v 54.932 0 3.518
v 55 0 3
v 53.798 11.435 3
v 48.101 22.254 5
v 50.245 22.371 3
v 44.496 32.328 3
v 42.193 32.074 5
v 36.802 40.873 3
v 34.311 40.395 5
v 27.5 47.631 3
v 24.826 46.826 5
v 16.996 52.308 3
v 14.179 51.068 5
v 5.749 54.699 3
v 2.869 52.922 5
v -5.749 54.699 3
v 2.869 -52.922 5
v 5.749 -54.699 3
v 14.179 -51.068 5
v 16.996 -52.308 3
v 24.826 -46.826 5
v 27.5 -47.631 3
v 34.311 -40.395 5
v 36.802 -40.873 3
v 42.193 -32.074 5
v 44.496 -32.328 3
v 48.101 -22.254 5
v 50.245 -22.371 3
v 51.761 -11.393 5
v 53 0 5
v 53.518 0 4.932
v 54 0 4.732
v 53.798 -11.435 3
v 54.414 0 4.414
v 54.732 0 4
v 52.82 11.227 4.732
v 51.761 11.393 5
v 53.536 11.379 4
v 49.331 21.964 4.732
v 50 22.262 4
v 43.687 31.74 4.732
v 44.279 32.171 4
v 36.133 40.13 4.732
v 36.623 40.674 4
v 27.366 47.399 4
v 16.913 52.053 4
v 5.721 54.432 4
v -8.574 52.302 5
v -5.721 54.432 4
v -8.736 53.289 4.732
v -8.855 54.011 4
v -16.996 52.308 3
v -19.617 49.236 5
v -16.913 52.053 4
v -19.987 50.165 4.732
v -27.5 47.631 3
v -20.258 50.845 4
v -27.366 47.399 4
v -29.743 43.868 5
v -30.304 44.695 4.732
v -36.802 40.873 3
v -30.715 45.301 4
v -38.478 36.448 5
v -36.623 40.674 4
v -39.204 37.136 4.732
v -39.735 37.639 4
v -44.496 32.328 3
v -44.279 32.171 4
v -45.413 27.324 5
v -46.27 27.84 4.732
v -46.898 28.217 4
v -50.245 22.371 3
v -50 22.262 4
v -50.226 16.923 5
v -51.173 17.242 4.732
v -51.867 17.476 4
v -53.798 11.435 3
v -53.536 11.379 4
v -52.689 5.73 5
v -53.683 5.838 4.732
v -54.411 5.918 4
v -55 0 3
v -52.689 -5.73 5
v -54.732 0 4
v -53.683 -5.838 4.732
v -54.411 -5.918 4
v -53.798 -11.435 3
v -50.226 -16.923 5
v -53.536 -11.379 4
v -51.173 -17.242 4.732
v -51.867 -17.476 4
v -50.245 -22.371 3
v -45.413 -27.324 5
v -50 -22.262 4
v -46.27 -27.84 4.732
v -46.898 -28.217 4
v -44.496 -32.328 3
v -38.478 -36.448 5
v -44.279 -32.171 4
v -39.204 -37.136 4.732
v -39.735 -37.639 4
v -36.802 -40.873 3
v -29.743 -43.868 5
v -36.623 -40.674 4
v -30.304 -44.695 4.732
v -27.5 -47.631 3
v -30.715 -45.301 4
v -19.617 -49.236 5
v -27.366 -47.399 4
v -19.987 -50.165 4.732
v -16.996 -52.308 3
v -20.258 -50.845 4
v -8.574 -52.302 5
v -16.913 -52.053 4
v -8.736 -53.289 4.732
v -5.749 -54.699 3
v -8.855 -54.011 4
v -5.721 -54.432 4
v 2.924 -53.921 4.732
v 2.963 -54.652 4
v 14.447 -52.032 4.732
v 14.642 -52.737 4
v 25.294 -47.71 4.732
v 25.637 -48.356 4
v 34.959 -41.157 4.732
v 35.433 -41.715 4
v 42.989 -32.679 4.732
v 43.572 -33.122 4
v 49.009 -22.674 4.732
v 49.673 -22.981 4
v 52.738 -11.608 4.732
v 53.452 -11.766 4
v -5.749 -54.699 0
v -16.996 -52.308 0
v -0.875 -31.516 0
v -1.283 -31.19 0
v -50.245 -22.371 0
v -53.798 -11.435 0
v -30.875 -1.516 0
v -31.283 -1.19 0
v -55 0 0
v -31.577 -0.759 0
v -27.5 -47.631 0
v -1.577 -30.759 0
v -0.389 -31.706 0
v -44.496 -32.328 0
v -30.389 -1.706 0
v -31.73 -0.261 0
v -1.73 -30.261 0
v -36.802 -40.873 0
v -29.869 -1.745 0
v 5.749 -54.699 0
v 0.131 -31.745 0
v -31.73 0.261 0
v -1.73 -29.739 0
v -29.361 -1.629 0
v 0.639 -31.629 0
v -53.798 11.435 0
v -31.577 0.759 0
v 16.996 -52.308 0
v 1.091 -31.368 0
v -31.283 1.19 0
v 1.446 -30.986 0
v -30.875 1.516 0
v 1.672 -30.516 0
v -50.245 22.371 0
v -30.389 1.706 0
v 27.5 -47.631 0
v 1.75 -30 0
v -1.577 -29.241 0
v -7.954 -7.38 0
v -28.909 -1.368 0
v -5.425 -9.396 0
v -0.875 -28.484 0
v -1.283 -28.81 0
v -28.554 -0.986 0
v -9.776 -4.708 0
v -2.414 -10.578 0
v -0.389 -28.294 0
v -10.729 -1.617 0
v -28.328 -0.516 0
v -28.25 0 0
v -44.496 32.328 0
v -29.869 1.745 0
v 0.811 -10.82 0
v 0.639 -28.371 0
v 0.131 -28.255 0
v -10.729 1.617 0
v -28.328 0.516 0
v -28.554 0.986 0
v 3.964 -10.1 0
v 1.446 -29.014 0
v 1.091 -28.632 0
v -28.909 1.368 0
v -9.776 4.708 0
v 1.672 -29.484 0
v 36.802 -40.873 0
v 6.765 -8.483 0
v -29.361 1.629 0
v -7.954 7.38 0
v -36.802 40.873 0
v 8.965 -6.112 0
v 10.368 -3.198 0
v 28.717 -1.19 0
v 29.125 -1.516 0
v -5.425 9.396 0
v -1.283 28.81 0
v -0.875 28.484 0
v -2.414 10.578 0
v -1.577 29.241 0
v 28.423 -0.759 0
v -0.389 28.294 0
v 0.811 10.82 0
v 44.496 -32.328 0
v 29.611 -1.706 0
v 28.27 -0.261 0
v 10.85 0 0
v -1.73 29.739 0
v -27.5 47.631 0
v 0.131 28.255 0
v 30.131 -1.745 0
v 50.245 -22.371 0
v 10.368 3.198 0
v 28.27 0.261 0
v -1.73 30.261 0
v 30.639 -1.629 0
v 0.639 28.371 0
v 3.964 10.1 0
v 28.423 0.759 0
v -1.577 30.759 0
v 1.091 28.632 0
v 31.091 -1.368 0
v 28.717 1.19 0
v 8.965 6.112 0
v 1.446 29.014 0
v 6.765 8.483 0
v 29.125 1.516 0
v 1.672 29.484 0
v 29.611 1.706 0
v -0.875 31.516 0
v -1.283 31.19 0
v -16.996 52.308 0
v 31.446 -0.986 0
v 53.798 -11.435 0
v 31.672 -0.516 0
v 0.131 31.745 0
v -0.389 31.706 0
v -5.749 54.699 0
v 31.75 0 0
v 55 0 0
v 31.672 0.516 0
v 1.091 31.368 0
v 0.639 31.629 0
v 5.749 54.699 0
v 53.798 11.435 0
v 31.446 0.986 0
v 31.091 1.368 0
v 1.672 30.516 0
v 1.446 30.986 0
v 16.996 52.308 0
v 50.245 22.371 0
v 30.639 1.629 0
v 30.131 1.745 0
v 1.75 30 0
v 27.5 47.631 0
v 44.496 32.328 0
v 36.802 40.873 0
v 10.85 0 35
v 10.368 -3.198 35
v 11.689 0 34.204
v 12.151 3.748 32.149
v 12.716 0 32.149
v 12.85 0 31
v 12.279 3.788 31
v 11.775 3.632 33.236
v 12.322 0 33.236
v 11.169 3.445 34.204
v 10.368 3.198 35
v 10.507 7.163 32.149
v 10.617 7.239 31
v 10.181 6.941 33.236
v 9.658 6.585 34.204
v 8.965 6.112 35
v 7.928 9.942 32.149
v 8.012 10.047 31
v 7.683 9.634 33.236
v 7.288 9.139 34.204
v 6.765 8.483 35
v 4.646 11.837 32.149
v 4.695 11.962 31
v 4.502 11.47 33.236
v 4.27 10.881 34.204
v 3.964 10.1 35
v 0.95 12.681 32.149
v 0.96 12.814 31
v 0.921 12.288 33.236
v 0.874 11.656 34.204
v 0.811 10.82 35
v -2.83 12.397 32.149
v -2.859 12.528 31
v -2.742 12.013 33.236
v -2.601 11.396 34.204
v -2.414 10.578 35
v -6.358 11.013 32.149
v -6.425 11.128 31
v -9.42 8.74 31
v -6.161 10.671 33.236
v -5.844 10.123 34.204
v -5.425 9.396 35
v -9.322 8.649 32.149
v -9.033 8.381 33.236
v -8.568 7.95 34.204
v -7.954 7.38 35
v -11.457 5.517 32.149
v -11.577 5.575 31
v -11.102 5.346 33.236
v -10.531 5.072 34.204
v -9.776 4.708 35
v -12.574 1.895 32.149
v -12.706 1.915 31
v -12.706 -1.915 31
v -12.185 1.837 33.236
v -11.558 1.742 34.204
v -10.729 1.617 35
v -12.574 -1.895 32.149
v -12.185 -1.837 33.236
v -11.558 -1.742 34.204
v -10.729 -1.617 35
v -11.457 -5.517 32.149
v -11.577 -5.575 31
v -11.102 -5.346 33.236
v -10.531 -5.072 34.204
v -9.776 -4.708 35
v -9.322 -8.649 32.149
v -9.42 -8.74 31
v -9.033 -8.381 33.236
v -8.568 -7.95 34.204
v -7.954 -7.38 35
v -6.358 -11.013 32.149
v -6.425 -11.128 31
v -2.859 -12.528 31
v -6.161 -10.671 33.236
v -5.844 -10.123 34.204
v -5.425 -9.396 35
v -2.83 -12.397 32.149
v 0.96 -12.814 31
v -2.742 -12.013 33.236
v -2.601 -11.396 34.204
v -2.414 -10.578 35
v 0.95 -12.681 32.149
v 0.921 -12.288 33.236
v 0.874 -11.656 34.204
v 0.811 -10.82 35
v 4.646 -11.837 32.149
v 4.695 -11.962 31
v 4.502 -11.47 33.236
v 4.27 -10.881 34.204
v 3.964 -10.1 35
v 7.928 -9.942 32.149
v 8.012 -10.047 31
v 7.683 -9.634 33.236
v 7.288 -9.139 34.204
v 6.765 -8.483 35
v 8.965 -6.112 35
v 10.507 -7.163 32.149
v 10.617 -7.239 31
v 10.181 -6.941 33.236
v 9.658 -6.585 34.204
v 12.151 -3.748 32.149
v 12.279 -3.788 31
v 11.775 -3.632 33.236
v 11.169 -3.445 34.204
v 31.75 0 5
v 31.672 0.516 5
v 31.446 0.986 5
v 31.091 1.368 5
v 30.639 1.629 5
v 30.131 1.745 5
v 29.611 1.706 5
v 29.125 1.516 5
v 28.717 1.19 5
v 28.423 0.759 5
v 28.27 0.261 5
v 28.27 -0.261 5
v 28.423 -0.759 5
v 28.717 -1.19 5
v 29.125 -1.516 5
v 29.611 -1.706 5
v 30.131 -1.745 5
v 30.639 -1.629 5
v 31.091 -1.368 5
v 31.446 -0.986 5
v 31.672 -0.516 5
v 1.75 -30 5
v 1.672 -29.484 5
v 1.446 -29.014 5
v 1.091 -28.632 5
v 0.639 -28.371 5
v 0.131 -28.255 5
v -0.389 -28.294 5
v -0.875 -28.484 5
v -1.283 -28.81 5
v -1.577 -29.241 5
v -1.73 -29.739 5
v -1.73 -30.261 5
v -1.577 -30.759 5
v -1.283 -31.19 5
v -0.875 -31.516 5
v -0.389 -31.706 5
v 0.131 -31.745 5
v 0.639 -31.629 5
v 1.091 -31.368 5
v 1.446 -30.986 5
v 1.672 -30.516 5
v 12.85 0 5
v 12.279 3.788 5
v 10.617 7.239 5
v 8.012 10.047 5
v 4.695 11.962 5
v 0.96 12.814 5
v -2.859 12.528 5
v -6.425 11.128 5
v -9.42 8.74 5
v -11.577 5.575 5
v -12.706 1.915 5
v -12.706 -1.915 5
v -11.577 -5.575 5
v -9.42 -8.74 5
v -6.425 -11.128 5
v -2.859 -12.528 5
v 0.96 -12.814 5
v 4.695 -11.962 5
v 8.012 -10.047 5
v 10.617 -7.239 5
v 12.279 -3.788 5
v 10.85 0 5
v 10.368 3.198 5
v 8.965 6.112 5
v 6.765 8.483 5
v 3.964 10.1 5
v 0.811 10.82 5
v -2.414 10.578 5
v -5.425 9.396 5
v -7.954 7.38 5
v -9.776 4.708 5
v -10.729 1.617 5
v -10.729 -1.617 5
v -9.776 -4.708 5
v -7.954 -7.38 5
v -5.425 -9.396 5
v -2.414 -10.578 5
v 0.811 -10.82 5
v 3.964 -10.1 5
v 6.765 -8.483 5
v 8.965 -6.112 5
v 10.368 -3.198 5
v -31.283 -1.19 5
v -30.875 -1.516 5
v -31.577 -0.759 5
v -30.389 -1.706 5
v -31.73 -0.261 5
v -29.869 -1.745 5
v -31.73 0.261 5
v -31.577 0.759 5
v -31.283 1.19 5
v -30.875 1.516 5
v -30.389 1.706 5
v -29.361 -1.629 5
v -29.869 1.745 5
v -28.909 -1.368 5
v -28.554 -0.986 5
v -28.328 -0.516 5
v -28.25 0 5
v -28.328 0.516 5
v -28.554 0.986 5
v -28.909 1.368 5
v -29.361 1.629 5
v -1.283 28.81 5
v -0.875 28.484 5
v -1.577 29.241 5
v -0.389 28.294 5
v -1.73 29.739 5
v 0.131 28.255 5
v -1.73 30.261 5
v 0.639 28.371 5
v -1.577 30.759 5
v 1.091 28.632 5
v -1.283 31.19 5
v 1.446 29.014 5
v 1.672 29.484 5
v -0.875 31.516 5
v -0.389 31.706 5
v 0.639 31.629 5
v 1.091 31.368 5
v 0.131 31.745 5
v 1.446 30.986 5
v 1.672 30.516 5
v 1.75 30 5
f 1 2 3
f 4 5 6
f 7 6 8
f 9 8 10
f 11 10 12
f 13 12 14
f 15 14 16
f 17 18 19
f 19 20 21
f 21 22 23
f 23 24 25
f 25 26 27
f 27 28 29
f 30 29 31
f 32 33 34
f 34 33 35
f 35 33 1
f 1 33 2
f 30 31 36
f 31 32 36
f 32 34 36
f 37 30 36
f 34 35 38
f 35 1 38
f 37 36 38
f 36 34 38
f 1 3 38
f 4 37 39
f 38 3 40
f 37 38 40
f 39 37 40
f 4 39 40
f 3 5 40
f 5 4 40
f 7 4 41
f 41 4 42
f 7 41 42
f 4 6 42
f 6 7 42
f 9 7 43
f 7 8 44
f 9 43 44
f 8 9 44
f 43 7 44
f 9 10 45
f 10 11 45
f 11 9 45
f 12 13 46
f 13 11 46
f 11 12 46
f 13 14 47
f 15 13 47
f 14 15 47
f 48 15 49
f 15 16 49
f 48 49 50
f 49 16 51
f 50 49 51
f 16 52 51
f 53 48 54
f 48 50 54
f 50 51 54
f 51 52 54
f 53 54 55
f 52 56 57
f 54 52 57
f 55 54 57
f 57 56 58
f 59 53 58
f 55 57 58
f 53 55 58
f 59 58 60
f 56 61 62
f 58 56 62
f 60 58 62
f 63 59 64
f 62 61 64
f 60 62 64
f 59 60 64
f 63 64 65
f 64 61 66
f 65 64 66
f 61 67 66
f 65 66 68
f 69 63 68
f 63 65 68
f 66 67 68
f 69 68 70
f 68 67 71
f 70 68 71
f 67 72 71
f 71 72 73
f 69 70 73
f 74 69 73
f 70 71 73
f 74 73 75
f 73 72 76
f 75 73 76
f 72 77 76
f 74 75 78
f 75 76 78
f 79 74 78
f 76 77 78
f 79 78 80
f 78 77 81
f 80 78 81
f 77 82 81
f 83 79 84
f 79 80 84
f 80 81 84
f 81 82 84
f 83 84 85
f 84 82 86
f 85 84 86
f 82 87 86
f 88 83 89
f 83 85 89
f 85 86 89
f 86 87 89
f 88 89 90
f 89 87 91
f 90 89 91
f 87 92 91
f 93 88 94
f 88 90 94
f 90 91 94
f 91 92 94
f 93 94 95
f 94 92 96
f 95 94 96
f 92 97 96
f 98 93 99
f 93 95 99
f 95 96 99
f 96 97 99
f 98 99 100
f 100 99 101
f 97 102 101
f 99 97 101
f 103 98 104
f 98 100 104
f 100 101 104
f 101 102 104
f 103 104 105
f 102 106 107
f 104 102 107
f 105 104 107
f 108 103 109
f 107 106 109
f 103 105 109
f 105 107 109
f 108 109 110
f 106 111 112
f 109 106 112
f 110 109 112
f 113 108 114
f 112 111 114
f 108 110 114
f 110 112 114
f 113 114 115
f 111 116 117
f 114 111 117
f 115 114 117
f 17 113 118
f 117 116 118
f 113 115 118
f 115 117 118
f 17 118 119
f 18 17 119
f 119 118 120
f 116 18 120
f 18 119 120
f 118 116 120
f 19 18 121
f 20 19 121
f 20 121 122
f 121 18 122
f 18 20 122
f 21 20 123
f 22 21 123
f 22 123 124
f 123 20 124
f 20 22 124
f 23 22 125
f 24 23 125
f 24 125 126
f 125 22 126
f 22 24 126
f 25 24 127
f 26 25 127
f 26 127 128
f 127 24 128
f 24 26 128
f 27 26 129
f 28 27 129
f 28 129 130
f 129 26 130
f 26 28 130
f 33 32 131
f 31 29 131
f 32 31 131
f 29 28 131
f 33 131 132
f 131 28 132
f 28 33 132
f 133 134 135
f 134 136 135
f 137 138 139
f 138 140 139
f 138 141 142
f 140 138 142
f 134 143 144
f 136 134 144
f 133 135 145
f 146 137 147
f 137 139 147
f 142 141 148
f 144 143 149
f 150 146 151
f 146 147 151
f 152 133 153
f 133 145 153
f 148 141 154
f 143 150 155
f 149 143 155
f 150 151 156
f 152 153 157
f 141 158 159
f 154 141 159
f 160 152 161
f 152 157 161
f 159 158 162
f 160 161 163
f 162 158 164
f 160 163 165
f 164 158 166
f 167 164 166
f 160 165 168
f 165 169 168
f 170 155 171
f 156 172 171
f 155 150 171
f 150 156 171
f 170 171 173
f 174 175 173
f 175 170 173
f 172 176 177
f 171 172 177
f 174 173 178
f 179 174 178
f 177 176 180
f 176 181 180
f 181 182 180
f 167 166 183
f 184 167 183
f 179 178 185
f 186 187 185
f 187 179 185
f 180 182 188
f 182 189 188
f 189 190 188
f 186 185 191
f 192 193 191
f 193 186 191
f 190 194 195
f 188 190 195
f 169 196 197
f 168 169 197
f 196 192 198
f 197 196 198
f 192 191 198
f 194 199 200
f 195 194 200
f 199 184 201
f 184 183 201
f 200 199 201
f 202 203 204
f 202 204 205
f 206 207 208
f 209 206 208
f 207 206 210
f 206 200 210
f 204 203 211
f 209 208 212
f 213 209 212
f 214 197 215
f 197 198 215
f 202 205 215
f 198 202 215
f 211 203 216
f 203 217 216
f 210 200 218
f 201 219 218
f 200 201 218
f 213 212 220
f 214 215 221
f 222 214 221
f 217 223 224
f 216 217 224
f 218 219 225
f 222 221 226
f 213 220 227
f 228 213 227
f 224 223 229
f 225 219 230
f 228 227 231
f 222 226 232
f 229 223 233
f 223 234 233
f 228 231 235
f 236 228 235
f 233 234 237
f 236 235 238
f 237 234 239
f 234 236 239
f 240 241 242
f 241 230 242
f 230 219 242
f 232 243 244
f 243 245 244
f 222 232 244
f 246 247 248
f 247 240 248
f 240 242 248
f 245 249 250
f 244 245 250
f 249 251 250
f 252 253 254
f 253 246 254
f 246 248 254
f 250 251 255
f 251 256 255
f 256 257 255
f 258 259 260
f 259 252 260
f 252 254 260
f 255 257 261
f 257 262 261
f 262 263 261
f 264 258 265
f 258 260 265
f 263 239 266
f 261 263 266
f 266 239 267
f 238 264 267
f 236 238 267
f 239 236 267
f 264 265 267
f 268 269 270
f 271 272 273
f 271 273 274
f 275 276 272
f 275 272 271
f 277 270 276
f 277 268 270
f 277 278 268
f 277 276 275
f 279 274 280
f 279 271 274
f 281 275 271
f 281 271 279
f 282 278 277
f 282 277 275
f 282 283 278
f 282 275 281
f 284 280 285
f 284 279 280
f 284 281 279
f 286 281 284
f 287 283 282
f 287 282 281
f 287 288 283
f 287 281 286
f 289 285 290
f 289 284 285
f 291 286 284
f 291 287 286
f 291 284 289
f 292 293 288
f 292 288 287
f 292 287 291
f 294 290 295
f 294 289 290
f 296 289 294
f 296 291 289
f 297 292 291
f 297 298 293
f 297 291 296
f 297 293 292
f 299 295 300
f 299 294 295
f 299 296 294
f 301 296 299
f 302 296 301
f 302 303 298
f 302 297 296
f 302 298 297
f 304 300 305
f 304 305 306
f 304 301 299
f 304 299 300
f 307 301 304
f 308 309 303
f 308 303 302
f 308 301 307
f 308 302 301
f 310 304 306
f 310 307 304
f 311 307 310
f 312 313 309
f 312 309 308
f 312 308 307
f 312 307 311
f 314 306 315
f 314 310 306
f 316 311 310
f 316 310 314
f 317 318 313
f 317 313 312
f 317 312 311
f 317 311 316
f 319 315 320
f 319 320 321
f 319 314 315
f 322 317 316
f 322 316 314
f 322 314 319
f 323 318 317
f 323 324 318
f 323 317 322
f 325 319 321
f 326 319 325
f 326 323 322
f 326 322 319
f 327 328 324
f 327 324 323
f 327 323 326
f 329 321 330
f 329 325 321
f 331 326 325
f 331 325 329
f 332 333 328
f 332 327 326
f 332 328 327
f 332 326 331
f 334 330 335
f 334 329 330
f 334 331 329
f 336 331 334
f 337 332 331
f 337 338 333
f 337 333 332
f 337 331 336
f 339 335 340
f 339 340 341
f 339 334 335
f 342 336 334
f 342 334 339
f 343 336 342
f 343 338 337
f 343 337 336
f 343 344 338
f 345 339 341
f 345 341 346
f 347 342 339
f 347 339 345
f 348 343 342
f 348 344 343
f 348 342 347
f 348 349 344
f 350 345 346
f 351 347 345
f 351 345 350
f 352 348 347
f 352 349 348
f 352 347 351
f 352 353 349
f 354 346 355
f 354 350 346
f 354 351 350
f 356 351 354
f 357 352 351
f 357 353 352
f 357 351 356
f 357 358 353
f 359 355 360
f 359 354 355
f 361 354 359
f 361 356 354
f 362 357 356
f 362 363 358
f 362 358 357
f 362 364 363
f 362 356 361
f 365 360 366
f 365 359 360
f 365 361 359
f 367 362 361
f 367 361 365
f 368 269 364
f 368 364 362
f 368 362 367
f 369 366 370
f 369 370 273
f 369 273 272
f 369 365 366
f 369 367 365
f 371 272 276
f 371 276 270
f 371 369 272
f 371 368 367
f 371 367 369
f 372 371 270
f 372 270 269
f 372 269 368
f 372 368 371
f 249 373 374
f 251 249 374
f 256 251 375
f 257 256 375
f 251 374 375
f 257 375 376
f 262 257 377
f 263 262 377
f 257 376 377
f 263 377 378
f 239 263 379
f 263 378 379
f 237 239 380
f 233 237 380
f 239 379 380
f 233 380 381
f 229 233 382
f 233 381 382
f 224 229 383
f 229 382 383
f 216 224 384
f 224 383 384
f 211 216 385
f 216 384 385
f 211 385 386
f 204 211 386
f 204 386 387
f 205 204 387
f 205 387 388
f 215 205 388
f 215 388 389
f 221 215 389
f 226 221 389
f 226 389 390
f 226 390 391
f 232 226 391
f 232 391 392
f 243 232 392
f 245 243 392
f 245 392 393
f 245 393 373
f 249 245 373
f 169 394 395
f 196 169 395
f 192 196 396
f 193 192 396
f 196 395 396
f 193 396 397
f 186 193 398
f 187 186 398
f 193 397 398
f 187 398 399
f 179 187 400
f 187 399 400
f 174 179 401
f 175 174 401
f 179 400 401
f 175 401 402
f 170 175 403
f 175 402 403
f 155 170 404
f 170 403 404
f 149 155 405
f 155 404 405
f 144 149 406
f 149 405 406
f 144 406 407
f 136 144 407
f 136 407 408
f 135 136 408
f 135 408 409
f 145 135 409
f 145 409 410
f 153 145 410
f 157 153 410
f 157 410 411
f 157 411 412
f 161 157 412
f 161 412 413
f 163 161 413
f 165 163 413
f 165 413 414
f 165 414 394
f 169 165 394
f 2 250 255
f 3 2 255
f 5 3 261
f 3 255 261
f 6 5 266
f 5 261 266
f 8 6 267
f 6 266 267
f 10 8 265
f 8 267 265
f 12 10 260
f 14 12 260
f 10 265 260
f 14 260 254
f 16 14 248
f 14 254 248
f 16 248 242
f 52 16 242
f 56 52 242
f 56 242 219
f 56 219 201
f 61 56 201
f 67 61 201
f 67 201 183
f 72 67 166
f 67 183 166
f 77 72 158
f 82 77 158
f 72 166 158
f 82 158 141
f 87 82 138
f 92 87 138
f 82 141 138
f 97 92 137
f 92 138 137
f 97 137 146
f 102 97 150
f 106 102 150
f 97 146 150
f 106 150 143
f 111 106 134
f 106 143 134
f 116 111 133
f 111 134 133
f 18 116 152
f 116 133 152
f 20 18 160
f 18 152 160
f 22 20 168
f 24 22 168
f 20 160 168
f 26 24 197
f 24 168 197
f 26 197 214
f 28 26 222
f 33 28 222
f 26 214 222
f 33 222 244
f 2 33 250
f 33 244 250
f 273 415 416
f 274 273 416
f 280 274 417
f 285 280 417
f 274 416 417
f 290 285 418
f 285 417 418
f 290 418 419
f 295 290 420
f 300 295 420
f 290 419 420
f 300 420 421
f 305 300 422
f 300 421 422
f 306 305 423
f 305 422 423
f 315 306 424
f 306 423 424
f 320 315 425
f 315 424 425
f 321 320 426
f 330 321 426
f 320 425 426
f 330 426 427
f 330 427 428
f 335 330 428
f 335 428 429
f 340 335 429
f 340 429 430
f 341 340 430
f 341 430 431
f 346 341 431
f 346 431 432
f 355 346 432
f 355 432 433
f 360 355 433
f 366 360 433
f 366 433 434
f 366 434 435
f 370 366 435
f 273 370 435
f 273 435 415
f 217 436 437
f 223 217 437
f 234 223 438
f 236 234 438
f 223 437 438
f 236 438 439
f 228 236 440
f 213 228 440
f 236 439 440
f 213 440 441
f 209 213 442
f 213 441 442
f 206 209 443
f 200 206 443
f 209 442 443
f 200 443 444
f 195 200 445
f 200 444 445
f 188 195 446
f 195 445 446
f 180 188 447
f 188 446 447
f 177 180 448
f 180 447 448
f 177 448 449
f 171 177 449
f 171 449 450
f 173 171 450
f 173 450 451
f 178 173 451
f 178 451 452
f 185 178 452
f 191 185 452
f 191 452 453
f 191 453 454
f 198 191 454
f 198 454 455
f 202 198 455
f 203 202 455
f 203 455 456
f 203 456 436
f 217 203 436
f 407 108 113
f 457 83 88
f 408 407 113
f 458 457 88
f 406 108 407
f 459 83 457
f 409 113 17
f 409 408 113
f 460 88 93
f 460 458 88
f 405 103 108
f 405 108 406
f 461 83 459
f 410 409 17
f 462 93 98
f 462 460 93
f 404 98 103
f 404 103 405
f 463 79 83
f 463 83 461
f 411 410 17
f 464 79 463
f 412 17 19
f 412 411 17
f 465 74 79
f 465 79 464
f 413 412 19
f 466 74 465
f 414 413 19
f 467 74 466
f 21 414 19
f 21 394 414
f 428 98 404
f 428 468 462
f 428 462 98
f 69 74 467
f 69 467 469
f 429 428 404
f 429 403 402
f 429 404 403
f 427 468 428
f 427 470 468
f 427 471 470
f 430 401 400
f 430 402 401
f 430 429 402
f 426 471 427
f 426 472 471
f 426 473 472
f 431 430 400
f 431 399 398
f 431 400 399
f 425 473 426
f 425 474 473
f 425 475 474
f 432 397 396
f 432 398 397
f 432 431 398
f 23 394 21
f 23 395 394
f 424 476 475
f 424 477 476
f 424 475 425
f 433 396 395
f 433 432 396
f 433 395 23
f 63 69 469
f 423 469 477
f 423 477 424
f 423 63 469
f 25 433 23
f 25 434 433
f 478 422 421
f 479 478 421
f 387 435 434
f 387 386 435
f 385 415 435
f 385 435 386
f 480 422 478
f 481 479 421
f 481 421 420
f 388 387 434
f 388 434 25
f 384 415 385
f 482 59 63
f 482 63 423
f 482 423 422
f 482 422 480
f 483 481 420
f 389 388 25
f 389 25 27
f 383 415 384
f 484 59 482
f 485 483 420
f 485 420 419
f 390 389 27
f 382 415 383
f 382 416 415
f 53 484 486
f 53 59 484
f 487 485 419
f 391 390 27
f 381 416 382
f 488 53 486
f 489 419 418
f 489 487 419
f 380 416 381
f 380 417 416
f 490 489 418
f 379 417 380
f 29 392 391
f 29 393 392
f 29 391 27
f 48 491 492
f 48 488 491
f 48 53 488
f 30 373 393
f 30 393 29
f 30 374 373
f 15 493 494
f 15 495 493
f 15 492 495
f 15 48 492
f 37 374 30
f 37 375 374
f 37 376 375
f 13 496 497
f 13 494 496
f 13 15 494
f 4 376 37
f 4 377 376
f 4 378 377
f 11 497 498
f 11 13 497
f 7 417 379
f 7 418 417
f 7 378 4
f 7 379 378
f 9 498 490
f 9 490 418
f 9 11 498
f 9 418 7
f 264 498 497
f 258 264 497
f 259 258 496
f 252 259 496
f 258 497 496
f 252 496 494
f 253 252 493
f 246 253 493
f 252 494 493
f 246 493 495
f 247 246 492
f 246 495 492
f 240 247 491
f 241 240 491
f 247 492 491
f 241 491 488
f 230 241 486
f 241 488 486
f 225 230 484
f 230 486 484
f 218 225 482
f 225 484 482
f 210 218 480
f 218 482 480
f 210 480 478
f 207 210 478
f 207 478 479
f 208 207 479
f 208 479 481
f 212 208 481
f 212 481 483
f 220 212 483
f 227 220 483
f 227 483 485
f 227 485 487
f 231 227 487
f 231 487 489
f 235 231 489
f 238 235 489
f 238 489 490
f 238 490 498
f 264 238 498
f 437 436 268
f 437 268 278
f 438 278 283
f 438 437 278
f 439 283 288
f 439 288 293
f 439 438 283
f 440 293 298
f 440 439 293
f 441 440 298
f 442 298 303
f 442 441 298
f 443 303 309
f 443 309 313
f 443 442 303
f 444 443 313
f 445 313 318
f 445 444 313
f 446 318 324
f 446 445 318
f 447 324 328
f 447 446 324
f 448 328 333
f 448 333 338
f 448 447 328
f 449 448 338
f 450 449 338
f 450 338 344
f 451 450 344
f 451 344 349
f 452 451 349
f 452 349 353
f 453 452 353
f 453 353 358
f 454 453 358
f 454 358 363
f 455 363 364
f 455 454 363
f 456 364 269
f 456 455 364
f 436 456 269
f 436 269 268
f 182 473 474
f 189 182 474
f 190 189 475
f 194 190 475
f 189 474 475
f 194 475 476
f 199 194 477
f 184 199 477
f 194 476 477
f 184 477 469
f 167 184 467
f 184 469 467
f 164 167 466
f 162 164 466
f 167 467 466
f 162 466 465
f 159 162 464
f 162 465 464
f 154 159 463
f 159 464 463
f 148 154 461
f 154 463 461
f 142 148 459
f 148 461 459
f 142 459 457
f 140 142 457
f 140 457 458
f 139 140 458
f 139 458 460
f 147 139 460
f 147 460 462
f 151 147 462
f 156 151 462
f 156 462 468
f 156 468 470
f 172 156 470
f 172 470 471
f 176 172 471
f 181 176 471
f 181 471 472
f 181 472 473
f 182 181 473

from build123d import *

# Parameters (mm, degrees)
F0_R     = 55
F1_DEPTH = 5
F2_R     = 10.85
F3_DEPTH = 25
F4_R     = 12.85
F4_R_2   = 10.85
F5_DEPTH = 30
F7_R     = 2
F8_R     = 1.75
F9_DEPTH = 25


# Not quite as in the source:
# - a fillet or chamfer that OpenCascade refuses, or shapes differently, is made with other operations: its cross-section is extruded or revolved along the edge and cut away or added


with BuildPart() as f1:
    # F0 (on Top) → F1 (new body)
    with BuildSketch(Plane.XY):
        Circle(F0_R)
    extrude(amount=F1_DEPTH)

    # F2 (on face) → F3 (cut)
    with BuildSketch(Plane.XY.offset(5)):
        Circle(F2_R)
    extrude(amount=-F3_DEPTH, mode=Mode.SUBTRACT)

    # F4 (on face) → F5 (join)
    with BuildSketch(Plane.XY.offset(5)):
        Circle(F4_R)
        Circle(F4_R_2, mode=Mode.SUBTRACT)
    extrude(amount=F5_DEPTH)

    # F6: fillet of radius 5 on 1 edges, made by hand

    # F6_s1 → F6_t2 (revolve, cut)
    with BuildSketch(Plane.XZ):
        with BuildLine():
            ThreePointArc((12.85, 31), (12.322135955, 33.2360679775), (10.85, 35))
            Line((10.85, 35), (12.85, 35))
            Line((12.85, 35), (12.85, 31))
        make_face()
    revolve(axis=Axis((0, 0, 35), (0, 0, 1)), mode=Mode.SUBTRACT)

    # F7
    f7_edges = [f1.edges().sort_by_distance(p)[0] for p in [
        (-55, 0, 5),
    ]]
    fillet(f7_edges, radius=F7_R)

    # F8 (on face) → F9 (cut)
    with BuildSketch(Plane.XY.offset(5)):
        with Locations((-30, 0)):
            Circle(F8_R)
        with Locations((0, -30)):
            Circle(F8_R)
        with Locations((30, 0)):
            Circle(F8_R)
        with Locations((0, 30)):
            Circle(F8_R)
    extrude(amount=-F9_DEPTH, mode=Mode.SUBTRACT)


solid = f1.part
